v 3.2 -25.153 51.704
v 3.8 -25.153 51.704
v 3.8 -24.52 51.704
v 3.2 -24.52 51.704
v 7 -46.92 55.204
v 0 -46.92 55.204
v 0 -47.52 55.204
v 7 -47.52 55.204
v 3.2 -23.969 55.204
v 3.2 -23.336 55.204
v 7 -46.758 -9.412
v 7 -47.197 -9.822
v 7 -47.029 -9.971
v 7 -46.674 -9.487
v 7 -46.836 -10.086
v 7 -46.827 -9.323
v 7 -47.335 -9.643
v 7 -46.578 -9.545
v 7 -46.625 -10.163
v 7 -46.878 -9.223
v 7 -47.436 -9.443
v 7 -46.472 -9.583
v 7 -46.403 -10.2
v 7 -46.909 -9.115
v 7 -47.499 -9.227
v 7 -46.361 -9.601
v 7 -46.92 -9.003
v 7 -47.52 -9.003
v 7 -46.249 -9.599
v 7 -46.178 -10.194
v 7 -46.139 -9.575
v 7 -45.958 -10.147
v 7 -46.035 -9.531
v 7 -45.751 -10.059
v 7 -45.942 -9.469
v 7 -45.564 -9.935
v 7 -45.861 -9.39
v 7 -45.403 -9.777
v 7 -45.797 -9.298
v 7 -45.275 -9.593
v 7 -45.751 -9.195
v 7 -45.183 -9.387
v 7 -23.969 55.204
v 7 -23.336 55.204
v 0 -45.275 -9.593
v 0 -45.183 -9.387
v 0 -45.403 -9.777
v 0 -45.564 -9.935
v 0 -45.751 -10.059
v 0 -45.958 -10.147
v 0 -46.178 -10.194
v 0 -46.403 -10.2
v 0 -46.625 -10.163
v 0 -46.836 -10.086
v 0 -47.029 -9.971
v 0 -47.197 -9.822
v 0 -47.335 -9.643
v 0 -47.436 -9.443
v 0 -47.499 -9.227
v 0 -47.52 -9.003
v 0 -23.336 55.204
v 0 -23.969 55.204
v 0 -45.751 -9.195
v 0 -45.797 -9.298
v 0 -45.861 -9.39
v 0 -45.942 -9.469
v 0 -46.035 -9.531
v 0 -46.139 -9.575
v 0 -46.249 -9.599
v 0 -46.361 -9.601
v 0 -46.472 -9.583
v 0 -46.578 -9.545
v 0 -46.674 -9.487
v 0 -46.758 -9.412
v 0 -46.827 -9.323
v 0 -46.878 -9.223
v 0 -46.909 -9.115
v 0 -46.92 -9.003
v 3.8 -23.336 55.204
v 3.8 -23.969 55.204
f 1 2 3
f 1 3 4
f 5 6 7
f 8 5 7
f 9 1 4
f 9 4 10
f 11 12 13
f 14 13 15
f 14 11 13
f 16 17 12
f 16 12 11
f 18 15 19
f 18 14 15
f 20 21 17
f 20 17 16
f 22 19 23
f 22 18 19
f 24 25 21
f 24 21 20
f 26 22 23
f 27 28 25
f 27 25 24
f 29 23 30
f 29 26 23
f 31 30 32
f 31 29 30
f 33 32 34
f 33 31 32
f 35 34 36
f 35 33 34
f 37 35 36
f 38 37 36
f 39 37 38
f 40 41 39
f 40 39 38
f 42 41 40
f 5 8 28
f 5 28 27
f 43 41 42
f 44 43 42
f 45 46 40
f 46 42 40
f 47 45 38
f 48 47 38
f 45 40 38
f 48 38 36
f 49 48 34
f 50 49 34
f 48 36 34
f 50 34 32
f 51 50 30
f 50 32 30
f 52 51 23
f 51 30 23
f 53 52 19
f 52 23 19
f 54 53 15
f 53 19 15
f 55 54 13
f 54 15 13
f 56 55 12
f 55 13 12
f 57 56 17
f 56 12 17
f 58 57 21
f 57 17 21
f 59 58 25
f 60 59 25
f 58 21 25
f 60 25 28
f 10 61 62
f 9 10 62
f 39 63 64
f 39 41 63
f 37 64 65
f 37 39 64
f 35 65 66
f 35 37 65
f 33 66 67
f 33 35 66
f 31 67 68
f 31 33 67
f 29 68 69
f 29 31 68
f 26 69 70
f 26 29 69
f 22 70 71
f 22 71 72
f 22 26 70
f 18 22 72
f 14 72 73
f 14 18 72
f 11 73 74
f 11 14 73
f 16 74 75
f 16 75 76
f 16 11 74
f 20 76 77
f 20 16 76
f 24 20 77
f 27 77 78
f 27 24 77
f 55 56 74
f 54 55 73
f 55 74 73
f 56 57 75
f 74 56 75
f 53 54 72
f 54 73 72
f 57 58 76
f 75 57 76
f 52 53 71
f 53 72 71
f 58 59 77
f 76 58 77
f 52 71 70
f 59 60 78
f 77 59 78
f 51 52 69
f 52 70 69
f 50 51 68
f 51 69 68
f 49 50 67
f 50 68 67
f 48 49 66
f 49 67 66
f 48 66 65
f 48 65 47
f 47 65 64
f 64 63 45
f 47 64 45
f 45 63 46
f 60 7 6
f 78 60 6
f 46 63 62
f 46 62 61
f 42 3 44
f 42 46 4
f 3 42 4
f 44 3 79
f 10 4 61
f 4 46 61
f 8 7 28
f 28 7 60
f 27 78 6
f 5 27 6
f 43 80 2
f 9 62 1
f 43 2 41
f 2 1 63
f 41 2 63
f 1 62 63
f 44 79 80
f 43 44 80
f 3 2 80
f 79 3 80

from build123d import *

# Parameters (mm, degrees)
F1_DEPTH = 7
F2_W     = 0.6
F2_H     = 3.5
F3_DEPTH = 32.5
F4_R     = 0.6
F5_R     = 1.2


with BuildPart() as f1:
    # F0 (on Right) → F1 (new body)
    with BuildSketch(Plane.YZ):
        Polygon((-46.919775, 55.204037), (-47.519775, 55.204037), (-47.519775, -16.295963), (-23.335952, 55.204037), (-23.969343, 55.204037), (-46.919775, -12.649414), align=None)
    extrude(amount=F1_DEPTH)

    # F2 (on face) → F3 (cut)
    with BuildSketch(Plane(origin=(0, -46.919775, 0), x_dir=(-1, 0, 0), z_dir=(0, 1, 0))):
        with Locations((-3.5, 53.454037)):
            Rectangle(F2_W, F2_H)
    extrude(amount=F3_DEPTH, mode=Mode.SUBTRACT)

    # F4
    f4_edges = [f1.edges().sort_by_distance(p)[0] for p in [
        (3.5, -46.919775, -12.649414),
    ]]
    fillet(f4_edges, radius=F4_R)

    # F5
    f5_edges = [f1.edges().sort_by_distance(p)[0] for p in [
        (3.5, -47.519775, -16.295963),
    ]]
    fillet(f5_edges, radius=F5_R)


solid = f1.part
